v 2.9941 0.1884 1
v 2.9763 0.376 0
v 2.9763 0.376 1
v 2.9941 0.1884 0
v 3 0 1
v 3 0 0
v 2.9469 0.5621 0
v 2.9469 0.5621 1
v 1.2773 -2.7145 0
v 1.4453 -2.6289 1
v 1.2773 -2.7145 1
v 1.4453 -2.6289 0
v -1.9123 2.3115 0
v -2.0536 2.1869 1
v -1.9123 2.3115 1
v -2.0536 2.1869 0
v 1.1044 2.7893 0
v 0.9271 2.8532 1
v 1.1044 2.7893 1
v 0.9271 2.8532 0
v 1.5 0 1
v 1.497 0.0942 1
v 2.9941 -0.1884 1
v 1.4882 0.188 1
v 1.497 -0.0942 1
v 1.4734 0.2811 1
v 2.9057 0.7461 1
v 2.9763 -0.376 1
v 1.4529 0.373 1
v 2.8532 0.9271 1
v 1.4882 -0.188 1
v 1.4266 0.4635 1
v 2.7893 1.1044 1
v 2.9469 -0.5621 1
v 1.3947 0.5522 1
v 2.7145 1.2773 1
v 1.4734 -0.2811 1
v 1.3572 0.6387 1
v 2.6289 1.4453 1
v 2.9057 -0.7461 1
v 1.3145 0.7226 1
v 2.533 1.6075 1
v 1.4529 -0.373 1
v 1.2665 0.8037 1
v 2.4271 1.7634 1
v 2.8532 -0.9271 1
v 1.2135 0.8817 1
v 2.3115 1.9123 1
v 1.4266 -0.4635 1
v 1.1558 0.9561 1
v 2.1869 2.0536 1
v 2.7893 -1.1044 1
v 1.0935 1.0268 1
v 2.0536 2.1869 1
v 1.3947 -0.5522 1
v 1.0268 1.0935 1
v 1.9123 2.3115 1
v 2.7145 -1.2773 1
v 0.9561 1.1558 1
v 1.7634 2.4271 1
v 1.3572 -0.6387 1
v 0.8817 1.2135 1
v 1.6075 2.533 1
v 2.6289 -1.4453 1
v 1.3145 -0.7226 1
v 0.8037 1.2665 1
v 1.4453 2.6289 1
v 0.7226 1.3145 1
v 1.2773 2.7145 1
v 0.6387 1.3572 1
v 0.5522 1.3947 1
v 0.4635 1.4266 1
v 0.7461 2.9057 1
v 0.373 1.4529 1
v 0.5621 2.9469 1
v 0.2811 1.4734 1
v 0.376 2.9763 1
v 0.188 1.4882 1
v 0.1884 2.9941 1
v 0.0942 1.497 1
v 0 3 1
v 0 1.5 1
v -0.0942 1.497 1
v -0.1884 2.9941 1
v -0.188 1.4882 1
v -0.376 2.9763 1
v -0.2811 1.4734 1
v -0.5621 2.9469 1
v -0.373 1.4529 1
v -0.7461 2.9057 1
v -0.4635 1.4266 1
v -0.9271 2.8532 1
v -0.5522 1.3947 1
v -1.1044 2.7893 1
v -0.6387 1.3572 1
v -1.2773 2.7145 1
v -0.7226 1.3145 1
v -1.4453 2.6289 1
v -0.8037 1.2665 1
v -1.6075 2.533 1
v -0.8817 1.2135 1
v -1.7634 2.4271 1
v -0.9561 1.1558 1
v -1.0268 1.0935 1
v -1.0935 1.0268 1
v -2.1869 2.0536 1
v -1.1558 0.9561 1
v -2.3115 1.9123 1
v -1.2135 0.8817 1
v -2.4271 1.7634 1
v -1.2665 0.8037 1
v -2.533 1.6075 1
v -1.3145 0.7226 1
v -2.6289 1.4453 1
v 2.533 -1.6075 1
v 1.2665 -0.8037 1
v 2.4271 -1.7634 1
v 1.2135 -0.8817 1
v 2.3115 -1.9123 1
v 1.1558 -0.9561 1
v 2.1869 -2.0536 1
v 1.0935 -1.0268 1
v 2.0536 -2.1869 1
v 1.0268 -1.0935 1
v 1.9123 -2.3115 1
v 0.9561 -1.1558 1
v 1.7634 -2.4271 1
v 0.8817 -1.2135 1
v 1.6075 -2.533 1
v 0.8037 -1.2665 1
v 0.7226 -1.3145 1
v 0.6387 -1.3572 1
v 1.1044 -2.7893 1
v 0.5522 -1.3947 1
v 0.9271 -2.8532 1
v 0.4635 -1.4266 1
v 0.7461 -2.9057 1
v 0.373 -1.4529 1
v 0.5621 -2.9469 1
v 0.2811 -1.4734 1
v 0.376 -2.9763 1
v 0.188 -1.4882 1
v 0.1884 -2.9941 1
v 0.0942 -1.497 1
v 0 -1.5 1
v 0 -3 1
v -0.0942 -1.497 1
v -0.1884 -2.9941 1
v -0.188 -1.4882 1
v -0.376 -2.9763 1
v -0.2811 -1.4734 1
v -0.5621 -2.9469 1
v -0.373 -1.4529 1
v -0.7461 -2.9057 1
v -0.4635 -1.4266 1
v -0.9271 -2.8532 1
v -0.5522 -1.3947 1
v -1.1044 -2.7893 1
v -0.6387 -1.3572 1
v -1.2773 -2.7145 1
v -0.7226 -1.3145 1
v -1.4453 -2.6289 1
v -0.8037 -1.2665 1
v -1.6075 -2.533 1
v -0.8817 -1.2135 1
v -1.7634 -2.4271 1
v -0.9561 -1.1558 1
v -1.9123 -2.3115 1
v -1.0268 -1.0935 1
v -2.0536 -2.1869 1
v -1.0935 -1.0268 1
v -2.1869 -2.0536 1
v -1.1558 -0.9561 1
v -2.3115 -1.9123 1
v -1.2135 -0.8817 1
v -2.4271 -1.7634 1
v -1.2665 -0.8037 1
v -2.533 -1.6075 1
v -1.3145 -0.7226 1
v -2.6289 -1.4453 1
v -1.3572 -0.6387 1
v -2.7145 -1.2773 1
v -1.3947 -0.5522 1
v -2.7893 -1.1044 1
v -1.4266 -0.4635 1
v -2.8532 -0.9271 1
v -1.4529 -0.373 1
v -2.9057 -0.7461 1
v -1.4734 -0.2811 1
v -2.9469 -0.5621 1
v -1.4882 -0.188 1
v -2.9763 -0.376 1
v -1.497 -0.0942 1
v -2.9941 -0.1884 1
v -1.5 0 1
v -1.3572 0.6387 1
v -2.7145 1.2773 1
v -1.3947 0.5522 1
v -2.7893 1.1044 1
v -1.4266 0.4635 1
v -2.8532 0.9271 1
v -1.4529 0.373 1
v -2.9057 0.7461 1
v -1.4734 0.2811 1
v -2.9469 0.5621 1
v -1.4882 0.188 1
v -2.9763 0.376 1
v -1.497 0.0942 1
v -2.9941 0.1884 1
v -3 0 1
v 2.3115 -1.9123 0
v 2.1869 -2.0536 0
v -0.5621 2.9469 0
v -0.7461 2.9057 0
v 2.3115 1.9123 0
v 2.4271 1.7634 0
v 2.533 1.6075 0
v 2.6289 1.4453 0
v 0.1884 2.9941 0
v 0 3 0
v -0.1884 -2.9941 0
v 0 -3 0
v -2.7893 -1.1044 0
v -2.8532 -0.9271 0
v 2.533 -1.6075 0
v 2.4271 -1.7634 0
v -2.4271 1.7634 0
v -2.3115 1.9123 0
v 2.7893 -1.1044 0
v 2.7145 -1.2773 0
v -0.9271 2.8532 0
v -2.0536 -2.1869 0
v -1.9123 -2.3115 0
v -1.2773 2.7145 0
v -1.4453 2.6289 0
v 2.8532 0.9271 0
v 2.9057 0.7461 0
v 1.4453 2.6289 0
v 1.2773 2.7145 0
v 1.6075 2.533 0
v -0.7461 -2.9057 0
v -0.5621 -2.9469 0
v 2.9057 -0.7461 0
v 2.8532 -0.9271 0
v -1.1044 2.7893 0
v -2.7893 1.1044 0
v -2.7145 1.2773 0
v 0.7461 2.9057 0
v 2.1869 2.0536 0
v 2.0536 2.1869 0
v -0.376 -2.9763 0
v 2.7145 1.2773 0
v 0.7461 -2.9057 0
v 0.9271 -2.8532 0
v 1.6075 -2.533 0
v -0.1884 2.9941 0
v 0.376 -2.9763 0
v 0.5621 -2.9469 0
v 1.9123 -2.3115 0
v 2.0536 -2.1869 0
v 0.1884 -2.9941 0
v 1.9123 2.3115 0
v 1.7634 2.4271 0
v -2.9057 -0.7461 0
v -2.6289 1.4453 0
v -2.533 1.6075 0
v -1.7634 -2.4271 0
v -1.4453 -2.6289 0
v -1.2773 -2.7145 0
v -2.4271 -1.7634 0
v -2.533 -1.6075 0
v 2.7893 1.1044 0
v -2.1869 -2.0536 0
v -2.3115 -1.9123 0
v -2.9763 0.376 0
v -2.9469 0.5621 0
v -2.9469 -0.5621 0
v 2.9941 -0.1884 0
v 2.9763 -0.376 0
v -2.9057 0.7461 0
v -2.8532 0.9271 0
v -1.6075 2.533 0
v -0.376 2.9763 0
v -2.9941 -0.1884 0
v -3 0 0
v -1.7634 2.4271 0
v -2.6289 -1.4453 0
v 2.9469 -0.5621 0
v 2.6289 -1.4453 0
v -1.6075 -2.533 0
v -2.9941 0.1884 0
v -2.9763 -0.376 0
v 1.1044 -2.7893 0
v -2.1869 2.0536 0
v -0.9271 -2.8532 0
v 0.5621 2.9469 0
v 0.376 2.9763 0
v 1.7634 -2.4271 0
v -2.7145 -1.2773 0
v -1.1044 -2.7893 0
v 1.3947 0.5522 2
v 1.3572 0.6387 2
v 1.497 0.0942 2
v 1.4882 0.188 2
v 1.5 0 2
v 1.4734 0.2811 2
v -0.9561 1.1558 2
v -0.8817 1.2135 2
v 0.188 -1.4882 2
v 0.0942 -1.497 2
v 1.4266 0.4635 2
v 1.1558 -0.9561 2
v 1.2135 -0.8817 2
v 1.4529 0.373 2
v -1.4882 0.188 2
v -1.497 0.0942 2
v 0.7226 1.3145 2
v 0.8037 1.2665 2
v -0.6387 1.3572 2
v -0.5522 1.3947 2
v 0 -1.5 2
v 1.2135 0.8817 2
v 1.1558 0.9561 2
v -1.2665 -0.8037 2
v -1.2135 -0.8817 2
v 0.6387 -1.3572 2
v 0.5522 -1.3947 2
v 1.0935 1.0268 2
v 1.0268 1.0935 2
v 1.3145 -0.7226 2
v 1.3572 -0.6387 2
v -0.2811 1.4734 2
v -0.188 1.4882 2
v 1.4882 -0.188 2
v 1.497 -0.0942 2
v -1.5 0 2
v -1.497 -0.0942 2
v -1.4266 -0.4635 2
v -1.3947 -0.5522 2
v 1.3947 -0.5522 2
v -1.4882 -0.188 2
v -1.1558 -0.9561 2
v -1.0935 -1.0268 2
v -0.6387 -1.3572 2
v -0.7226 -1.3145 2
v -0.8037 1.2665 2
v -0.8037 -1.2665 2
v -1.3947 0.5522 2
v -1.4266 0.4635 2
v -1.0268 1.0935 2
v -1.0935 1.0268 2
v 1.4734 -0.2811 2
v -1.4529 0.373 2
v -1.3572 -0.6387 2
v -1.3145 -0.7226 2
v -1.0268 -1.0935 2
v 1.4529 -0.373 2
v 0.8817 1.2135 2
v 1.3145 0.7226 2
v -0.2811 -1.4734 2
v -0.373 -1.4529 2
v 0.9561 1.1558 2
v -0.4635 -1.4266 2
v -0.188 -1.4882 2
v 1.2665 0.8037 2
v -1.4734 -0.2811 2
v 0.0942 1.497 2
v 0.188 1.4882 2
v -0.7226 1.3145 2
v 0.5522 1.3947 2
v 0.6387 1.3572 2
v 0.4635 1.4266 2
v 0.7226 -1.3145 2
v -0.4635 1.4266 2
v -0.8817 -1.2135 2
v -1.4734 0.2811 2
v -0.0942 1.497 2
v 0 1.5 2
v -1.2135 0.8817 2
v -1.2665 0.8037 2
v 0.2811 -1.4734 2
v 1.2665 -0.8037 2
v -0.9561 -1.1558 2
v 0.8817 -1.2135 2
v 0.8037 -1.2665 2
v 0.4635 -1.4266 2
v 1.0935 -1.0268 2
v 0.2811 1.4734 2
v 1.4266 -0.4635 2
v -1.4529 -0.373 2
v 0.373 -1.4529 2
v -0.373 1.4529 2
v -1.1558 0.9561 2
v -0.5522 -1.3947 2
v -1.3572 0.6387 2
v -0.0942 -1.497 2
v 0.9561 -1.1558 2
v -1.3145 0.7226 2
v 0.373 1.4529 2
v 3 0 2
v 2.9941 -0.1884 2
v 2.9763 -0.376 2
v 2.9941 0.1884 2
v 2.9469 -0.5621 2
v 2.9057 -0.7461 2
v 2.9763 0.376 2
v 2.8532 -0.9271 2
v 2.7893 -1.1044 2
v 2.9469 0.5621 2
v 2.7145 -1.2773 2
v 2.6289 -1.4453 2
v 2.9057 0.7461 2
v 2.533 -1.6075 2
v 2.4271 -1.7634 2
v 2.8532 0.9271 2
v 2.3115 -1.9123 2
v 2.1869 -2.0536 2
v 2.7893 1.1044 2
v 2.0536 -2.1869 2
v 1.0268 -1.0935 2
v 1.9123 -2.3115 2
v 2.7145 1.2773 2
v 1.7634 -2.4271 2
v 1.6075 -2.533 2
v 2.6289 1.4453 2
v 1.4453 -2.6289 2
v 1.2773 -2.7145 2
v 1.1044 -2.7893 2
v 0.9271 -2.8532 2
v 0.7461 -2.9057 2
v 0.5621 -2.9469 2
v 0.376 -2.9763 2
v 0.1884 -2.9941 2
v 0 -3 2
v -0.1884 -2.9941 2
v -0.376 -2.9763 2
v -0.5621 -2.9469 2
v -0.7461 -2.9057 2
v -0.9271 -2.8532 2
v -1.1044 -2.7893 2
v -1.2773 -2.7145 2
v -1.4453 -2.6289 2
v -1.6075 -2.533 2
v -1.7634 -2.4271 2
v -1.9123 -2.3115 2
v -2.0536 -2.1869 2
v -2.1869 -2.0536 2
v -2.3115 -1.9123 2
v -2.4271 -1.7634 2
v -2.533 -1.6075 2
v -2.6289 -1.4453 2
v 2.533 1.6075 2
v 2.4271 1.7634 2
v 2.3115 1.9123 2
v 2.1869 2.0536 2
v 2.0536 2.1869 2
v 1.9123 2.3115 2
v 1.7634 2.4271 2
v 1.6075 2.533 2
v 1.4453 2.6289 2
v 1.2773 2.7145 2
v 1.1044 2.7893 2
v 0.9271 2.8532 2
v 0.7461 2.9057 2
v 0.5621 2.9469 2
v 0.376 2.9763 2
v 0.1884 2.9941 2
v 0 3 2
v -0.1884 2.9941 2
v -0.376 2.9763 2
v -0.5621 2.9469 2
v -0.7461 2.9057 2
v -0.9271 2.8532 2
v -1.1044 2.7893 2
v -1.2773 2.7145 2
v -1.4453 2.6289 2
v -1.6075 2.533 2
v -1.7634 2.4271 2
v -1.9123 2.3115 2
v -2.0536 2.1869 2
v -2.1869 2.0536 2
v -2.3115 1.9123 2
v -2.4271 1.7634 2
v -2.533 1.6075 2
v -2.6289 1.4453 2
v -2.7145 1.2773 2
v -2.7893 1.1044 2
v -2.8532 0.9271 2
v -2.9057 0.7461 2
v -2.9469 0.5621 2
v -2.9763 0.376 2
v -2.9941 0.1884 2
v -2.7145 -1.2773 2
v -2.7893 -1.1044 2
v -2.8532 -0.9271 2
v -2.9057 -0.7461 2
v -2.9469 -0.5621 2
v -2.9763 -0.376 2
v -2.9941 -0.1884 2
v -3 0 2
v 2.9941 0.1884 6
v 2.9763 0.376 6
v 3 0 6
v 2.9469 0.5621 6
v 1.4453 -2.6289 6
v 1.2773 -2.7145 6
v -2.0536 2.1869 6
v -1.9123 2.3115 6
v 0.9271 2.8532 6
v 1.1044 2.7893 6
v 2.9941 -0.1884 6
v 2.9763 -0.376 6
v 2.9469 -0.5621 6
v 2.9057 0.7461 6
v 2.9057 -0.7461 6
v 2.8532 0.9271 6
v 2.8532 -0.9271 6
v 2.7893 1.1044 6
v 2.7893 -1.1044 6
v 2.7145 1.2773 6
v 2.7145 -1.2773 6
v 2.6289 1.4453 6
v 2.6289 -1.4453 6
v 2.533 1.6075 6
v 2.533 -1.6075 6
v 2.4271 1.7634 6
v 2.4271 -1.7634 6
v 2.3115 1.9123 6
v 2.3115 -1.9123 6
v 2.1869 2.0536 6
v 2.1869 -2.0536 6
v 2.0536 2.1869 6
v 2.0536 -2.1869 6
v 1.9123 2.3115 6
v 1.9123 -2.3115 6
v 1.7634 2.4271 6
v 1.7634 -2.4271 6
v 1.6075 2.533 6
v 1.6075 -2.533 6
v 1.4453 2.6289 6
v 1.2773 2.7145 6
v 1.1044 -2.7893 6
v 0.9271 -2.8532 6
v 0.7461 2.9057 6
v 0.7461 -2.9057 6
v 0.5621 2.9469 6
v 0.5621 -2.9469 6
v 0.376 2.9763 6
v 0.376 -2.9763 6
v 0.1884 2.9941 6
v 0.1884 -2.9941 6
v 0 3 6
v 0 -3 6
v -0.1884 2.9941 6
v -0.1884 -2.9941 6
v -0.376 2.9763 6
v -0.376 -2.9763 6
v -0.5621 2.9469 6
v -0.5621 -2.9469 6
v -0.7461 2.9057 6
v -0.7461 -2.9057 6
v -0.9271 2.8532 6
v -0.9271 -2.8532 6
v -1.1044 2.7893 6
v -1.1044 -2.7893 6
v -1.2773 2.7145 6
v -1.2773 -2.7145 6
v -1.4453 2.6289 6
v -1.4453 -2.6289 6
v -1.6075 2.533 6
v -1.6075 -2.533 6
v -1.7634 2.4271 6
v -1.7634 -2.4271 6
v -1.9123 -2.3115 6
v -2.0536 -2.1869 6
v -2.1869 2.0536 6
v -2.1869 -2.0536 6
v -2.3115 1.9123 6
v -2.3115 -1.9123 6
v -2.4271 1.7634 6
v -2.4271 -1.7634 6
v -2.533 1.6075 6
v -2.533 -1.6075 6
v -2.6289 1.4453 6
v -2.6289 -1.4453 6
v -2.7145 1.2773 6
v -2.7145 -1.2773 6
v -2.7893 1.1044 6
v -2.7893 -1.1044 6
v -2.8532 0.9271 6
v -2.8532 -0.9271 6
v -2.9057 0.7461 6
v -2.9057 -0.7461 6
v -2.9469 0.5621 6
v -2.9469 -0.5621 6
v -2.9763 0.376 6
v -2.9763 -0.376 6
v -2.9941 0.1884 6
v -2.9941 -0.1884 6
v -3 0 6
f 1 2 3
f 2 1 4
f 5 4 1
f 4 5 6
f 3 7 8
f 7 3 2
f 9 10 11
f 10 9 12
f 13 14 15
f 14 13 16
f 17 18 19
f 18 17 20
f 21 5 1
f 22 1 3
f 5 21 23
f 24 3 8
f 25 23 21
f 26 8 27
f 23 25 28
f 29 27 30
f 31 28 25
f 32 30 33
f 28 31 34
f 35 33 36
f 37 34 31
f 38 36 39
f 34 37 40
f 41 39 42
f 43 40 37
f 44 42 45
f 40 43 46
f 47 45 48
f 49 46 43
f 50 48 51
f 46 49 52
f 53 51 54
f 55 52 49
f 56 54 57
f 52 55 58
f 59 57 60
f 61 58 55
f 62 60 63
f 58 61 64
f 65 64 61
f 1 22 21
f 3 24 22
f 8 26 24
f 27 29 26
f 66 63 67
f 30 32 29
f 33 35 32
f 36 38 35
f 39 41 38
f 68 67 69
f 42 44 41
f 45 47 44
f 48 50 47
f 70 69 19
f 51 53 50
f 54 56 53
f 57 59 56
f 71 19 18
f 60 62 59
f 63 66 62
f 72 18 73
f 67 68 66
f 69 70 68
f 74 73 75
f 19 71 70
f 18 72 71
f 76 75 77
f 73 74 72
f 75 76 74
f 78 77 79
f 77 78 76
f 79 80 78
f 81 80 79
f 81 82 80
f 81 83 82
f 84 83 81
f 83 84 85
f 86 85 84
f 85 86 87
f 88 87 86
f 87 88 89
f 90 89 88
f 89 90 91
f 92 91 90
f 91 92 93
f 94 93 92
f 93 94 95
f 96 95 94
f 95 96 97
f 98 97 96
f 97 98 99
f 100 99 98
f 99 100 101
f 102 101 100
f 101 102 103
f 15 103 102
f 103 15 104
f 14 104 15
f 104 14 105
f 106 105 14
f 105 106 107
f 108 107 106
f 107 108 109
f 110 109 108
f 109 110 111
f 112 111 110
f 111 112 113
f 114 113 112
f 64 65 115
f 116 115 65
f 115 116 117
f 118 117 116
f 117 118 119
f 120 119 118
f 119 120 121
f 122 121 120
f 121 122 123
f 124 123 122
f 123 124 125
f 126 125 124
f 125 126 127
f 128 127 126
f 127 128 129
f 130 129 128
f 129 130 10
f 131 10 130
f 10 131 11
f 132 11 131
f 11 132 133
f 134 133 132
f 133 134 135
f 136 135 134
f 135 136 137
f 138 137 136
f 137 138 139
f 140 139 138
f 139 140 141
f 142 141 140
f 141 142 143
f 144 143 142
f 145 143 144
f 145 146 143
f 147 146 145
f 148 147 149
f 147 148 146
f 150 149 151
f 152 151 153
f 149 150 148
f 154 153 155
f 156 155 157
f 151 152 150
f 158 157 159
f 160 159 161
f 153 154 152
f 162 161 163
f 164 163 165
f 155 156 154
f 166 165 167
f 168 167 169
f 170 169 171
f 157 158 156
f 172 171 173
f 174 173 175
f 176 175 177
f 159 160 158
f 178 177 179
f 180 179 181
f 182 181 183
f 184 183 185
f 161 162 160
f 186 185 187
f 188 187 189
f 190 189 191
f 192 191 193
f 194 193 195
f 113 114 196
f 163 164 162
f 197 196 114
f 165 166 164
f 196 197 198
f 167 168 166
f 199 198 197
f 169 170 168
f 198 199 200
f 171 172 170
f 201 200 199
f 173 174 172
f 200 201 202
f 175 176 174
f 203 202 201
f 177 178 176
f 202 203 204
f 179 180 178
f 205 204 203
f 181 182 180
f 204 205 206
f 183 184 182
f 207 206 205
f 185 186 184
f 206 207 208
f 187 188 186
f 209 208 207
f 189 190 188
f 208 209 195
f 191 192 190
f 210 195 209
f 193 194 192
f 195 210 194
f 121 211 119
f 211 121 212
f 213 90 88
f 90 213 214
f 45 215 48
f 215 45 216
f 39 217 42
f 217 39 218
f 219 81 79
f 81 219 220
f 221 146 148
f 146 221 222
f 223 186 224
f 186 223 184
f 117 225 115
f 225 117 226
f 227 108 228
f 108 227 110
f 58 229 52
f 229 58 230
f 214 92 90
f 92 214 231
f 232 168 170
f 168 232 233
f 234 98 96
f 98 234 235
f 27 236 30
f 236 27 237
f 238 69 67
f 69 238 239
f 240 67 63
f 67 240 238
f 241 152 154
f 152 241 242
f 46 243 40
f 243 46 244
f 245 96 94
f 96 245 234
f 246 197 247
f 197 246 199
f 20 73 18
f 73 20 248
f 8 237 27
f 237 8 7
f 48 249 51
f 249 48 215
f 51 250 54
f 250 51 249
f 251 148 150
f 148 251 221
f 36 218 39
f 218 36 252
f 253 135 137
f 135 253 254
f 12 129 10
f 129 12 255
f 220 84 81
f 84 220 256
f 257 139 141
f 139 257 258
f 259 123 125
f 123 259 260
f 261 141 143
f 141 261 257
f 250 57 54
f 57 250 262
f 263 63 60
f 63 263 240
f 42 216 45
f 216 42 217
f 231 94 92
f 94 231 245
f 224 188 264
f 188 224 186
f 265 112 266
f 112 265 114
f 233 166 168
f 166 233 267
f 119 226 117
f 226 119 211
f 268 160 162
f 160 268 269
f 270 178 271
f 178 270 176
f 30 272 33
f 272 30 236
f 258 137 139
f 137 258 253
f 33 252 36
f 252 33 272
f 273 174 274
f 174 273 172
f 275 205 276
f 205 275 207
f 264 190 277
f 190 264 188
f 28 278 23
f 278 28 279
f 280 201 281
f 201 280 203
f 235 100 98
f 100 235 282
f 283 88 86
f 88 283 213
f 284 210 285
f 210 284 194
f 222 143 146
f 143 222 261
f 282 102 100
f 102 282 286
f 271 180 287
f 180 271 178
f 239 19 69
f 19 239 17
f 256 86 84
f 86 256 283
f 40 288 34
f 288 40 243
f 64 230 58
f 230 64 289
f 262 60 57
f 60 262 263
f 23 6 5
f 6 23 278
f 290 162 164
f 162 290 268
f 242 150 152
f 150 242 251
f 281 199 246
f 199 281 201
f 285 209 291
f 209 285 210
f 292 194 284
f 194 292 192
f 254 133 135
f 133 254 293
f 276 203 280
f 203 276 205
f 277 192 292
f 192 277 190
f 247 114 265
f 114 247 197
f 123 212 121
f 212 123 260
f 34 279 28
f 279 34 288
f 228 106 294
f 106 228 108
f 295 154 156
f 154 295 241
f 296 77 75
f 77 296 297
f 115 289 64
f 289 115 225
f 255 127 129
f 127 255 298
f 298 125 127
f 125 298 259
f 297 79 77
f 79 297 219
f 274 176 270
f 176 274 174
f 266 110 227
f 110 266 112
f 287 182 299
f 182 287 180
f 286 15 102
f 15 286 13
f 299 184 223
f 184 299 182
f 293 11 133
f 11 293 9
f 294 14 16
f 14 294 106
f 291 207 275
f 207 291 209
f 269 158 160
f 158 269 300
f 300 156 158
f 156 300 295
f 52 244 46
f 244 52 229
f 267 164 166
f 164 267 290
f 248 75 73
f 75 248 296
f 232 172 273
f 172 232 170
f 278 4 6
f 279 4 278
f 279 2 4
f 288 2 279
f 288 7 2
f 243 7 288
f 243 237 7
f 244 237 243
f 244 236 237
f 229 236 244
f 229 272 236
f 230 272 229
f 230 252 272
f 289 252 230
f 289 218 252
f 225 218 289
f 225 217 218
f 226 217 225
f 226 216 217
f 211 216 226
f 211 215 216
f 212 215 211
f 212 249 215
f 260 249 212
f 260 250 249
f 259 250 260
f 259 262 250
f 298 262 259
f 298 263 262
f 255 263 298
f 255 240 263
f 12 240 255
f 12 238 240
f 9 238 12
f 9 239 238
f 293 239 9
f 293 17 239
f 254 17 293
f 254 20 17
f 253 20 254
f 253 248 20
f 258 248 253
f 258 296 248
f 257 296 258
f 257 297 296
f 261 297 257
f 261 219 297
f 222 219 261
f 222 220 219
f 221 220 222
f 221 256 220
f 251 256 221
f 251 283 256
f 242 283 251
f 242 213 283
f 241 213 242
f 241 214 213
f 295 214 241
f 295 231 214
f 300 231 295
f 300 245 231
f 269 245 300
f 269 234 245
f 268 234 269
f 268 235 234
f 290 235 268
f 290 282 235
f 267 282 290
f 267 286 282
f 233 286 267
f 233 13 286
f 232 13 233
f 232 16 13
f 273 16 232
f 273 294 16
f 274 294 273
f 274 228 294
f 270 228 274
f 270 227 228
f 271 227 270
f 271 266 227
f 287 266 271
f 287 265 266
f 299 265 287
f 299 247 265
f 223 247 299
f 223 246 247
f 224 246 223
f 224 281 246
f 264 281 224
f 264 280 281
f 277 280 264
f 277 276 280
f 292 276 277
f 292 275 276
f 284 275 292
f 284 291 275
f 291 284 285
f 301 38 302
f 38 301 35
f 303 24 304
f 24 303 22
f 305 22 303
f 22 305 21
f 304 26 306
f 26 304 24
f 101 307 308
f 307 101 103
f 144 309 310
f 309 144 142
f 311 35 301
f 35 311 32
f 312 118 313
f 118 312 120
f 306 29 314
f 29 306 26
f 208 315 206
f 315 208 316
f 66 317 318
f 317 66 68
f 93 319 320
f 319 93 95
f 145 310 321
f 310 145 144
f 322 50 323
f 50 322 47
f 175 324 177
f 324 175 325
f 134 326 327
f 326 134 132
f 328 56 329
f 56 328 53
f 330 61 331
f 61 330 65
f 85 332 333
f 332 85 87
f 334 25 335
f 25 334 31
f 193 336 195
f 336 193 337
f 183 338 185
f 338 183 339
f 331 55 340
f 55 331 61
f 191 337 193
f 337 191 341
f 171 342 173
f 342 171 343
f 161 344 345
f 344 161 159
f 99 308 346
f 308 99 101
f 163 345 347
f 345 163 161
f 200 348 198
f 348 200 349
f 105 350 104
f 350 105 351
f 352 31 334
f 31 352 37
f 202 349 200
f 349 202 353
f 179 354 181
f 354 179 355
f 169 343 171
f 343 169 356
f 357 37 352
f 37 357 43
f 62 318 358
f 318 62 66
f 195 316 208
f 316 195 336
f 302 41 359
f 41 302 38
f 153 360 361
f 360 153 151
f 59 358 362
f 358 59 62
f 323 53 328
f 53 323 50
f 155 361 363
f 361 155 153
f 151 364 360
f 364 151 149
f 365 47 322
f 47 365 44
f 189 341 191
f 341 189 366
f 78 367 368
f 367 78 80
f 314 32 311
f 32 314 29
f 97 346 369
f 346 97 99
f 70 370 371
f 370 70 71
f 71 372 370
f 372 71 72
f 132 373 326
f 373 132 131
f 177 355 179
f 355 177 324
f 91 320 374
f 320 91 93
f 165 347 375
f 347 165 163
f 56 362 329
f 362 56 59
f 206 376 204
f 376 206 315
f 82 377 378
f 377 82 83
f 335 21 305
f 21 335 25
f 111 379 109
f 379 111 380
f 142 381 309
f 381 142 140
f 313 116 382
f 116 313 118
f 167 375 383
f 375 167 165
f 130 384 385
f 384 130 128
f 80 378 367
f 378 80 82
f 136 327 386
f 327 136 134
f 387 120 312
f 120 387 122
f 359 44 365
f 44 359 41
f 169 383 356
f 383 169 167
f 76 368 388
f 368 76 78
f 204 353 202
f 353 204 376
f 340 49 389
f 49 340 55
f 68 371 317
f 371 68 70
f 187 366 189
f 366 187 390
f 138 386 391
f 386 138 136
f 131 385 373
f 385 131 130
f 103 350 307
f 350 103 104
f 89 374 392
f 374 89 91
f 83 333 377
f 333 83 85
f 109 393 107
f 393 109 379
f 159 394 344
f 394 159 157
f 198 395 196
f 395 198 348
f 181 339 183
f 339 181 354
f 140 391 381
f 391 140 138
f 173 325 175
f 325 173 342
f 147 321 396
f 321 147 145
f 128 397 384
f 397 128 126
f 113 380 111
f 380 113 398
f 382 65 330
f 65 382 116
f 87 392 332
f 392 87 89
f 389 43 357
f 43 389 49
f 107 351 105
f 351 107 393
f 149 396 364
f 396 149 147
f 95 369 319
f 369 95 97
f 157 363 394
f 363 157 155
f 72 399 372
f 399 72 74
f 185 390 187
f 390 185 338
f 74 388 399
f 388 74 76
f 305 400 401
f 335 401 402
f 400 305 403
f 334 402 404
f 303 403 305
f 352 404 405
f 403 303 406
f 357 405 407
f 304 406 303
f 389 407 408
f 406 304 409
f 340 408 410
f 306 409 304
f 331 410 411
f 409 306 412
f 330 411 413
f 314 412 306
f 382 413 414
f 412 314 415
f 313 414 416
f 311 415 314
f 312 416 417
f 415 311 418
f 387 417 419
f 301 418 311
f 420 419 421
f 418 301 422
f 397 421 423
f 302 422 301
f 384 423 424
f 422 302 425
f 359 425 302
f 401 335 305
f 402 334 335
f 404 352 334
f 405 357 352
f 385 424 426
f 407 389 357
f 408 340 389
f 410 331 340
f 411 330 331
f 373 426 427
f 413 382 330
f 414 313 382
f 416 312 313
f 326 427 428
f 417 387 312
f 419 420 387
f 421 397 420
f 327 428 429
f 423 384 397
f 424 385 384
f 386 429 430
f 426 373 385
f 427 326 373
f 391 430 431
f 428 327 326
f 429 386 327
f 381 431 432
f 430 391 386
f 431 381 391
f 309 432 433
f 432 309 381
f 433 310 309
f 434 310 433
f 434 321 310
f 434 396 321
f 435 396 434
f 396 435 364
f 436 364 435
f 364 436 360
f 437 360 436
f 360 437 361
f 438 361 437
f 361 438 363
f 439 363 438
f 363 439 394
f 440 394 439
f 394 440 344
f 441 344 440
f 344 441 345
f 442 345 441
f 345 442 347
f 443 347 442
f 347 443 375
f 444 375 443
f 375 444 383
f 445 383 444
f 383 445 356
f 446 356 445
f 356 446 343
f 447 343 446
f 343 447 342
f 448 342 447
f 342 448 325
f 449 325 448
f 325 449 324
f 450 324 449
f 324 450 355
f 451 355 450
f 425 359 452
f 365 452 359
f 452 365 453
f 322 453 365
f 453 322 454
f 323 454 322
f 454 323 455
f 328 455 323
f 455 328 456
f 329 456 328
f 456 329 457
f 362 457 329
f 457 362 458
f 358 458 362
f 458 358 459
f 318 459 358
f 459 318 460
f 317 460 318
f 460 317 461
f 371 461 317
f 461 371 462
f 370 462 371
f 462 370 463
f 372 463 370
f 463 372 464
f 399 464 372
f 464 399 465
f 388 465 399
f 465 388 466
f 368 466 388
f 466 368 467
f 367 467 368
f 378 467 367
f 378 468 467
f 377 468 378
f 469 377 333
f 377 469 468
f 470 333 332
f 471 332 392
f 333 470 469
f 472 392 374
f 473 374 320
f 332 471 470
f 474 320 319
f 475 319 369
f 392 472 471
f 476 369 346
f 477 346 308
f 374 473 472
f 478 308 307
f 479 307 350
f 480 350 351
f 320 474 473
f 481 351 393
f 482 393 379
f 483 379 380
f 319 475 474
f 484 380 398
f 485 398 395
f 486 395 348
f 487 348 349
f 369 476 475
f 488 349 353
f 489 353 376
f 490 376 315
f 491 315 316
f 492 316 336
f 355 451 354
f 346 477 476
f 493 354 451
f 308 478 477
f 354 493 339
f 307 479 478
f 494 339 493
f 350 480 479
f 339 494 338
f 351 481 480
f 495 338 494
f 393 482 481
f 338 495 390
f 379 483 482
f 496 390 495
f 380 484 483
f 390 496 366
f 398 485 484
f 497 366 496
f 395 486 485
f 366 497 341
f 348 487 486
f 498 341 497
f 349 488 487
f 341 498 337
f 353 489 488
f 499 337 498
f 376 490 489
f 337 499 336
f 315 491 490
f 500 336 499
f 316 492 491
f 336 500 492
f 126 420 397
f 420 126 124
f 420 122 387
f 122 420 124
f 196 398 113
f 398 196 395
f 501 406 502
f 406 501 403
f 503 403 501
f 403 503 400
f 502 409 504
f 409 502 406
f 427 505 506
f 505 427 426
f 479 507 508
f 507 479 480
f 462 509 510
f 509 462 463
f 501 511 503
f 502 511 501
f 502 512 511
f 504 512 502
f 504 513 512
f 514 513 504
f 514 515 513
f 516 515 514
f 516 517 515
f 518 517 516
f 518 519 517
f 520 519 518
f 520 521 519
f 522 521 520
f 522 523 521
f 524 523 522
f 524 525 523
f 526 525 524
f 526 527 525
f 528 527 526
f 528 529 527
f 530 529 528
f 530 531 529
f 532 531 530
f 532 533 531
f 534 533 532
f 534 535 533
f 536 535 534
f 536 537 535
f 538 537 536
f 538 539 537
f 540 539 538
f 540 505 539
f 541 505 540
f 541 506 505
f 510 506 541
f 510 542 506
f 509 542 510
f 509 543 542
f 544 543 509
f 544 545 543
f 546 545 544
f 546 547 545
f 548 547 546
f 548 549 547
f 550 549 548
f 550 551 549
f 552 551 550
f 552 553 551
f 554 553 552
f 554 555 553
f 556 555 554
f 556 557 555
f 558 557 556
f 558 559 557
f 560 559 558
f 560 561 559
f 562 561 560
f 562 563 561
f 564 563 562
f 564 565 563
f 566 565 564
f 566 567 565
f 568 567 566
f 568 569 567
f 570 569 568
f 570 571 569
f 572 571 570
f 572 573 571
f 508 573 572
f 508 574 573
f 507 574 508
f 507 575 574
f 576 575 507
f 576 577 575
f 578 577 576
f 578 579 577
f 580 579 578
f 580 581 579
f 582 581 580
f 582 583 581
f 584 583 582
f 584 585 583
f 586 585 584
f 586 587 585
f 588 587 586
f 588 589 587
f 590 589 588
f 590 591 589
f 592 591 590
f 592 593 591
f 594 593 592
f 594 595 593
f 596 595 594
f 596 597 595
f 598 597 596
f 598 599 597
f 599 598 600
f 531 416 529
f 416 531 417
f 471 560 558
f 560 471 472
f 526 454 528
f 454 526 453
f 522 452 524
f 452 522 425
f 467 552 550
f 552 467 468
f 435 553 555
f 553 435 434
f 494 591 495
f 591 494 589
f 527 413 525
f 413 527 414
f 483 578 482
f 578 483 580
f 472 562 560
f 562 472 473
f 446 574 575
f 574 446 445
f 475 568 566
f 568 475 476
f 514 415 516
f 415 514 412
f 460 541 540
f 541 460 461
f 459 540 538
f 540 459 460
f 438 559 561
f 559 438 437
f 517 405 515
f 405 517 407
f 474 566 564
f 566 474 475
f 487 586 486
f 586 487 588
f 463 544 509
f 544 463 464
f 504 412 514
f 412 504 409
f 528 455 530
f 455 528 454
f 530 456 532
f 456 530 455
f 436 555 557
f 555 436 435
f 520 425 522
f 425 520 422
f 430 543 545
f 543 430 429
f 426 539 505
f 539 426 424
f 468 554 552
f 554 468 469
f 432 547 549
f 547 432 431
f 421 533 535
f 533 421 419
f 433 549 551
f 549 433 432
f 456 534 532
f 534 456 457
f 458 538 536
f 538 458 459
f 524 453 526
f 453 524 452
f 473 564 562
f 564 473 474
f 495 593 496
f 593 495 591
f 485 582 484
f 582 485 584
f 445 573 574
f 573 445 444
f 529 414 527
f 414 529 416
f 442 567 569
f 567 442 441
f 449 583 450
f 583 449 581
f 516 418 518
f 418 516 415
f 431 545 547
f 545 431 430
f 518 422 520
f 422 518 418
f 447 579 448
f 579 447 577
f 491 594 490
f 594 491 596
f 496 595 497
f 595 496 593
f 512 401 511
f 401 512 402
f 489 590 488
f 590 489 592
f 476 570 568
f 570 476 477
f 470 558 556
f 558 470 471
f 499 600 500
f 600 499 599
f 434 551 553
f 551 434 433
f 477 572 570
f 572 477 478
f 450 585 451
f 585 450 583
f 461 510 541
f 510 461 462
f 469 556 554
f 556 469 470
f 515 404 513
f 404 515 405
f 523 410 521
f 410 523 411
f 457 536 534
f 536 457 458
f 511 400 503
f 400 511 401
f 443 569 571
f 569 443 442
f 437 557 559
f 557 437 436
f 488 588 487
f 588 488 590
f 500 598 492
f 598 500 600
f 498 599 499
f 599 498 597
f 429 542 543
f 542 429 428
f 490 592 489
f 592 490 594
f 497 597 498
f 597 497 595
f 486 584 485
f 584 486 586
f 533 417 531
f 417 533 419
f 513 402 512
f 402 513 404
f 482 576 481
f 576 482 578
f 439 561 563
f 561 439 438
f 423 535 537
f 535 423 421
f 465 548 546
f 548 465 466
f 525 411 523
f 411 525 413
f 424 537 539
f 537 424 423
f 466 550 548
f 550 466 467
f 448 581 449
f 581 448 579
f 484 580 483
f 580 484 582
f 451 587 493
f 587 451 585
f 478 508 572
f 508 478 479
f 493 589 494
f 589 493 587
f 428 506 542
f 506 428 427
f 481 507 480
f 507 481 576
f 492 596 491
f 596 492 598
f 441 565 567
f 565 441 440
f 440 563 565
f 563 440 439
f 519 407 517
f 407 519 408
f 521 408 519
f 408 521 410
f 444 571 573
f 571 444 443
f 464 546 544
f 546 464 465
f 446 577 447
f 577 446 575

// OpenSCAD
outerRad = 3;
innerRad = 1.5;

union () {
  cylinder(r = outerRad, h = 1, $fn = 100);
  {
    cylinder(r = innerRad, h = 2, $fn = 100);
  }
  {
    translate([0,0,2]) cylinder(r = outerRad, h = 4, $fn = 100);
    
  }
}
